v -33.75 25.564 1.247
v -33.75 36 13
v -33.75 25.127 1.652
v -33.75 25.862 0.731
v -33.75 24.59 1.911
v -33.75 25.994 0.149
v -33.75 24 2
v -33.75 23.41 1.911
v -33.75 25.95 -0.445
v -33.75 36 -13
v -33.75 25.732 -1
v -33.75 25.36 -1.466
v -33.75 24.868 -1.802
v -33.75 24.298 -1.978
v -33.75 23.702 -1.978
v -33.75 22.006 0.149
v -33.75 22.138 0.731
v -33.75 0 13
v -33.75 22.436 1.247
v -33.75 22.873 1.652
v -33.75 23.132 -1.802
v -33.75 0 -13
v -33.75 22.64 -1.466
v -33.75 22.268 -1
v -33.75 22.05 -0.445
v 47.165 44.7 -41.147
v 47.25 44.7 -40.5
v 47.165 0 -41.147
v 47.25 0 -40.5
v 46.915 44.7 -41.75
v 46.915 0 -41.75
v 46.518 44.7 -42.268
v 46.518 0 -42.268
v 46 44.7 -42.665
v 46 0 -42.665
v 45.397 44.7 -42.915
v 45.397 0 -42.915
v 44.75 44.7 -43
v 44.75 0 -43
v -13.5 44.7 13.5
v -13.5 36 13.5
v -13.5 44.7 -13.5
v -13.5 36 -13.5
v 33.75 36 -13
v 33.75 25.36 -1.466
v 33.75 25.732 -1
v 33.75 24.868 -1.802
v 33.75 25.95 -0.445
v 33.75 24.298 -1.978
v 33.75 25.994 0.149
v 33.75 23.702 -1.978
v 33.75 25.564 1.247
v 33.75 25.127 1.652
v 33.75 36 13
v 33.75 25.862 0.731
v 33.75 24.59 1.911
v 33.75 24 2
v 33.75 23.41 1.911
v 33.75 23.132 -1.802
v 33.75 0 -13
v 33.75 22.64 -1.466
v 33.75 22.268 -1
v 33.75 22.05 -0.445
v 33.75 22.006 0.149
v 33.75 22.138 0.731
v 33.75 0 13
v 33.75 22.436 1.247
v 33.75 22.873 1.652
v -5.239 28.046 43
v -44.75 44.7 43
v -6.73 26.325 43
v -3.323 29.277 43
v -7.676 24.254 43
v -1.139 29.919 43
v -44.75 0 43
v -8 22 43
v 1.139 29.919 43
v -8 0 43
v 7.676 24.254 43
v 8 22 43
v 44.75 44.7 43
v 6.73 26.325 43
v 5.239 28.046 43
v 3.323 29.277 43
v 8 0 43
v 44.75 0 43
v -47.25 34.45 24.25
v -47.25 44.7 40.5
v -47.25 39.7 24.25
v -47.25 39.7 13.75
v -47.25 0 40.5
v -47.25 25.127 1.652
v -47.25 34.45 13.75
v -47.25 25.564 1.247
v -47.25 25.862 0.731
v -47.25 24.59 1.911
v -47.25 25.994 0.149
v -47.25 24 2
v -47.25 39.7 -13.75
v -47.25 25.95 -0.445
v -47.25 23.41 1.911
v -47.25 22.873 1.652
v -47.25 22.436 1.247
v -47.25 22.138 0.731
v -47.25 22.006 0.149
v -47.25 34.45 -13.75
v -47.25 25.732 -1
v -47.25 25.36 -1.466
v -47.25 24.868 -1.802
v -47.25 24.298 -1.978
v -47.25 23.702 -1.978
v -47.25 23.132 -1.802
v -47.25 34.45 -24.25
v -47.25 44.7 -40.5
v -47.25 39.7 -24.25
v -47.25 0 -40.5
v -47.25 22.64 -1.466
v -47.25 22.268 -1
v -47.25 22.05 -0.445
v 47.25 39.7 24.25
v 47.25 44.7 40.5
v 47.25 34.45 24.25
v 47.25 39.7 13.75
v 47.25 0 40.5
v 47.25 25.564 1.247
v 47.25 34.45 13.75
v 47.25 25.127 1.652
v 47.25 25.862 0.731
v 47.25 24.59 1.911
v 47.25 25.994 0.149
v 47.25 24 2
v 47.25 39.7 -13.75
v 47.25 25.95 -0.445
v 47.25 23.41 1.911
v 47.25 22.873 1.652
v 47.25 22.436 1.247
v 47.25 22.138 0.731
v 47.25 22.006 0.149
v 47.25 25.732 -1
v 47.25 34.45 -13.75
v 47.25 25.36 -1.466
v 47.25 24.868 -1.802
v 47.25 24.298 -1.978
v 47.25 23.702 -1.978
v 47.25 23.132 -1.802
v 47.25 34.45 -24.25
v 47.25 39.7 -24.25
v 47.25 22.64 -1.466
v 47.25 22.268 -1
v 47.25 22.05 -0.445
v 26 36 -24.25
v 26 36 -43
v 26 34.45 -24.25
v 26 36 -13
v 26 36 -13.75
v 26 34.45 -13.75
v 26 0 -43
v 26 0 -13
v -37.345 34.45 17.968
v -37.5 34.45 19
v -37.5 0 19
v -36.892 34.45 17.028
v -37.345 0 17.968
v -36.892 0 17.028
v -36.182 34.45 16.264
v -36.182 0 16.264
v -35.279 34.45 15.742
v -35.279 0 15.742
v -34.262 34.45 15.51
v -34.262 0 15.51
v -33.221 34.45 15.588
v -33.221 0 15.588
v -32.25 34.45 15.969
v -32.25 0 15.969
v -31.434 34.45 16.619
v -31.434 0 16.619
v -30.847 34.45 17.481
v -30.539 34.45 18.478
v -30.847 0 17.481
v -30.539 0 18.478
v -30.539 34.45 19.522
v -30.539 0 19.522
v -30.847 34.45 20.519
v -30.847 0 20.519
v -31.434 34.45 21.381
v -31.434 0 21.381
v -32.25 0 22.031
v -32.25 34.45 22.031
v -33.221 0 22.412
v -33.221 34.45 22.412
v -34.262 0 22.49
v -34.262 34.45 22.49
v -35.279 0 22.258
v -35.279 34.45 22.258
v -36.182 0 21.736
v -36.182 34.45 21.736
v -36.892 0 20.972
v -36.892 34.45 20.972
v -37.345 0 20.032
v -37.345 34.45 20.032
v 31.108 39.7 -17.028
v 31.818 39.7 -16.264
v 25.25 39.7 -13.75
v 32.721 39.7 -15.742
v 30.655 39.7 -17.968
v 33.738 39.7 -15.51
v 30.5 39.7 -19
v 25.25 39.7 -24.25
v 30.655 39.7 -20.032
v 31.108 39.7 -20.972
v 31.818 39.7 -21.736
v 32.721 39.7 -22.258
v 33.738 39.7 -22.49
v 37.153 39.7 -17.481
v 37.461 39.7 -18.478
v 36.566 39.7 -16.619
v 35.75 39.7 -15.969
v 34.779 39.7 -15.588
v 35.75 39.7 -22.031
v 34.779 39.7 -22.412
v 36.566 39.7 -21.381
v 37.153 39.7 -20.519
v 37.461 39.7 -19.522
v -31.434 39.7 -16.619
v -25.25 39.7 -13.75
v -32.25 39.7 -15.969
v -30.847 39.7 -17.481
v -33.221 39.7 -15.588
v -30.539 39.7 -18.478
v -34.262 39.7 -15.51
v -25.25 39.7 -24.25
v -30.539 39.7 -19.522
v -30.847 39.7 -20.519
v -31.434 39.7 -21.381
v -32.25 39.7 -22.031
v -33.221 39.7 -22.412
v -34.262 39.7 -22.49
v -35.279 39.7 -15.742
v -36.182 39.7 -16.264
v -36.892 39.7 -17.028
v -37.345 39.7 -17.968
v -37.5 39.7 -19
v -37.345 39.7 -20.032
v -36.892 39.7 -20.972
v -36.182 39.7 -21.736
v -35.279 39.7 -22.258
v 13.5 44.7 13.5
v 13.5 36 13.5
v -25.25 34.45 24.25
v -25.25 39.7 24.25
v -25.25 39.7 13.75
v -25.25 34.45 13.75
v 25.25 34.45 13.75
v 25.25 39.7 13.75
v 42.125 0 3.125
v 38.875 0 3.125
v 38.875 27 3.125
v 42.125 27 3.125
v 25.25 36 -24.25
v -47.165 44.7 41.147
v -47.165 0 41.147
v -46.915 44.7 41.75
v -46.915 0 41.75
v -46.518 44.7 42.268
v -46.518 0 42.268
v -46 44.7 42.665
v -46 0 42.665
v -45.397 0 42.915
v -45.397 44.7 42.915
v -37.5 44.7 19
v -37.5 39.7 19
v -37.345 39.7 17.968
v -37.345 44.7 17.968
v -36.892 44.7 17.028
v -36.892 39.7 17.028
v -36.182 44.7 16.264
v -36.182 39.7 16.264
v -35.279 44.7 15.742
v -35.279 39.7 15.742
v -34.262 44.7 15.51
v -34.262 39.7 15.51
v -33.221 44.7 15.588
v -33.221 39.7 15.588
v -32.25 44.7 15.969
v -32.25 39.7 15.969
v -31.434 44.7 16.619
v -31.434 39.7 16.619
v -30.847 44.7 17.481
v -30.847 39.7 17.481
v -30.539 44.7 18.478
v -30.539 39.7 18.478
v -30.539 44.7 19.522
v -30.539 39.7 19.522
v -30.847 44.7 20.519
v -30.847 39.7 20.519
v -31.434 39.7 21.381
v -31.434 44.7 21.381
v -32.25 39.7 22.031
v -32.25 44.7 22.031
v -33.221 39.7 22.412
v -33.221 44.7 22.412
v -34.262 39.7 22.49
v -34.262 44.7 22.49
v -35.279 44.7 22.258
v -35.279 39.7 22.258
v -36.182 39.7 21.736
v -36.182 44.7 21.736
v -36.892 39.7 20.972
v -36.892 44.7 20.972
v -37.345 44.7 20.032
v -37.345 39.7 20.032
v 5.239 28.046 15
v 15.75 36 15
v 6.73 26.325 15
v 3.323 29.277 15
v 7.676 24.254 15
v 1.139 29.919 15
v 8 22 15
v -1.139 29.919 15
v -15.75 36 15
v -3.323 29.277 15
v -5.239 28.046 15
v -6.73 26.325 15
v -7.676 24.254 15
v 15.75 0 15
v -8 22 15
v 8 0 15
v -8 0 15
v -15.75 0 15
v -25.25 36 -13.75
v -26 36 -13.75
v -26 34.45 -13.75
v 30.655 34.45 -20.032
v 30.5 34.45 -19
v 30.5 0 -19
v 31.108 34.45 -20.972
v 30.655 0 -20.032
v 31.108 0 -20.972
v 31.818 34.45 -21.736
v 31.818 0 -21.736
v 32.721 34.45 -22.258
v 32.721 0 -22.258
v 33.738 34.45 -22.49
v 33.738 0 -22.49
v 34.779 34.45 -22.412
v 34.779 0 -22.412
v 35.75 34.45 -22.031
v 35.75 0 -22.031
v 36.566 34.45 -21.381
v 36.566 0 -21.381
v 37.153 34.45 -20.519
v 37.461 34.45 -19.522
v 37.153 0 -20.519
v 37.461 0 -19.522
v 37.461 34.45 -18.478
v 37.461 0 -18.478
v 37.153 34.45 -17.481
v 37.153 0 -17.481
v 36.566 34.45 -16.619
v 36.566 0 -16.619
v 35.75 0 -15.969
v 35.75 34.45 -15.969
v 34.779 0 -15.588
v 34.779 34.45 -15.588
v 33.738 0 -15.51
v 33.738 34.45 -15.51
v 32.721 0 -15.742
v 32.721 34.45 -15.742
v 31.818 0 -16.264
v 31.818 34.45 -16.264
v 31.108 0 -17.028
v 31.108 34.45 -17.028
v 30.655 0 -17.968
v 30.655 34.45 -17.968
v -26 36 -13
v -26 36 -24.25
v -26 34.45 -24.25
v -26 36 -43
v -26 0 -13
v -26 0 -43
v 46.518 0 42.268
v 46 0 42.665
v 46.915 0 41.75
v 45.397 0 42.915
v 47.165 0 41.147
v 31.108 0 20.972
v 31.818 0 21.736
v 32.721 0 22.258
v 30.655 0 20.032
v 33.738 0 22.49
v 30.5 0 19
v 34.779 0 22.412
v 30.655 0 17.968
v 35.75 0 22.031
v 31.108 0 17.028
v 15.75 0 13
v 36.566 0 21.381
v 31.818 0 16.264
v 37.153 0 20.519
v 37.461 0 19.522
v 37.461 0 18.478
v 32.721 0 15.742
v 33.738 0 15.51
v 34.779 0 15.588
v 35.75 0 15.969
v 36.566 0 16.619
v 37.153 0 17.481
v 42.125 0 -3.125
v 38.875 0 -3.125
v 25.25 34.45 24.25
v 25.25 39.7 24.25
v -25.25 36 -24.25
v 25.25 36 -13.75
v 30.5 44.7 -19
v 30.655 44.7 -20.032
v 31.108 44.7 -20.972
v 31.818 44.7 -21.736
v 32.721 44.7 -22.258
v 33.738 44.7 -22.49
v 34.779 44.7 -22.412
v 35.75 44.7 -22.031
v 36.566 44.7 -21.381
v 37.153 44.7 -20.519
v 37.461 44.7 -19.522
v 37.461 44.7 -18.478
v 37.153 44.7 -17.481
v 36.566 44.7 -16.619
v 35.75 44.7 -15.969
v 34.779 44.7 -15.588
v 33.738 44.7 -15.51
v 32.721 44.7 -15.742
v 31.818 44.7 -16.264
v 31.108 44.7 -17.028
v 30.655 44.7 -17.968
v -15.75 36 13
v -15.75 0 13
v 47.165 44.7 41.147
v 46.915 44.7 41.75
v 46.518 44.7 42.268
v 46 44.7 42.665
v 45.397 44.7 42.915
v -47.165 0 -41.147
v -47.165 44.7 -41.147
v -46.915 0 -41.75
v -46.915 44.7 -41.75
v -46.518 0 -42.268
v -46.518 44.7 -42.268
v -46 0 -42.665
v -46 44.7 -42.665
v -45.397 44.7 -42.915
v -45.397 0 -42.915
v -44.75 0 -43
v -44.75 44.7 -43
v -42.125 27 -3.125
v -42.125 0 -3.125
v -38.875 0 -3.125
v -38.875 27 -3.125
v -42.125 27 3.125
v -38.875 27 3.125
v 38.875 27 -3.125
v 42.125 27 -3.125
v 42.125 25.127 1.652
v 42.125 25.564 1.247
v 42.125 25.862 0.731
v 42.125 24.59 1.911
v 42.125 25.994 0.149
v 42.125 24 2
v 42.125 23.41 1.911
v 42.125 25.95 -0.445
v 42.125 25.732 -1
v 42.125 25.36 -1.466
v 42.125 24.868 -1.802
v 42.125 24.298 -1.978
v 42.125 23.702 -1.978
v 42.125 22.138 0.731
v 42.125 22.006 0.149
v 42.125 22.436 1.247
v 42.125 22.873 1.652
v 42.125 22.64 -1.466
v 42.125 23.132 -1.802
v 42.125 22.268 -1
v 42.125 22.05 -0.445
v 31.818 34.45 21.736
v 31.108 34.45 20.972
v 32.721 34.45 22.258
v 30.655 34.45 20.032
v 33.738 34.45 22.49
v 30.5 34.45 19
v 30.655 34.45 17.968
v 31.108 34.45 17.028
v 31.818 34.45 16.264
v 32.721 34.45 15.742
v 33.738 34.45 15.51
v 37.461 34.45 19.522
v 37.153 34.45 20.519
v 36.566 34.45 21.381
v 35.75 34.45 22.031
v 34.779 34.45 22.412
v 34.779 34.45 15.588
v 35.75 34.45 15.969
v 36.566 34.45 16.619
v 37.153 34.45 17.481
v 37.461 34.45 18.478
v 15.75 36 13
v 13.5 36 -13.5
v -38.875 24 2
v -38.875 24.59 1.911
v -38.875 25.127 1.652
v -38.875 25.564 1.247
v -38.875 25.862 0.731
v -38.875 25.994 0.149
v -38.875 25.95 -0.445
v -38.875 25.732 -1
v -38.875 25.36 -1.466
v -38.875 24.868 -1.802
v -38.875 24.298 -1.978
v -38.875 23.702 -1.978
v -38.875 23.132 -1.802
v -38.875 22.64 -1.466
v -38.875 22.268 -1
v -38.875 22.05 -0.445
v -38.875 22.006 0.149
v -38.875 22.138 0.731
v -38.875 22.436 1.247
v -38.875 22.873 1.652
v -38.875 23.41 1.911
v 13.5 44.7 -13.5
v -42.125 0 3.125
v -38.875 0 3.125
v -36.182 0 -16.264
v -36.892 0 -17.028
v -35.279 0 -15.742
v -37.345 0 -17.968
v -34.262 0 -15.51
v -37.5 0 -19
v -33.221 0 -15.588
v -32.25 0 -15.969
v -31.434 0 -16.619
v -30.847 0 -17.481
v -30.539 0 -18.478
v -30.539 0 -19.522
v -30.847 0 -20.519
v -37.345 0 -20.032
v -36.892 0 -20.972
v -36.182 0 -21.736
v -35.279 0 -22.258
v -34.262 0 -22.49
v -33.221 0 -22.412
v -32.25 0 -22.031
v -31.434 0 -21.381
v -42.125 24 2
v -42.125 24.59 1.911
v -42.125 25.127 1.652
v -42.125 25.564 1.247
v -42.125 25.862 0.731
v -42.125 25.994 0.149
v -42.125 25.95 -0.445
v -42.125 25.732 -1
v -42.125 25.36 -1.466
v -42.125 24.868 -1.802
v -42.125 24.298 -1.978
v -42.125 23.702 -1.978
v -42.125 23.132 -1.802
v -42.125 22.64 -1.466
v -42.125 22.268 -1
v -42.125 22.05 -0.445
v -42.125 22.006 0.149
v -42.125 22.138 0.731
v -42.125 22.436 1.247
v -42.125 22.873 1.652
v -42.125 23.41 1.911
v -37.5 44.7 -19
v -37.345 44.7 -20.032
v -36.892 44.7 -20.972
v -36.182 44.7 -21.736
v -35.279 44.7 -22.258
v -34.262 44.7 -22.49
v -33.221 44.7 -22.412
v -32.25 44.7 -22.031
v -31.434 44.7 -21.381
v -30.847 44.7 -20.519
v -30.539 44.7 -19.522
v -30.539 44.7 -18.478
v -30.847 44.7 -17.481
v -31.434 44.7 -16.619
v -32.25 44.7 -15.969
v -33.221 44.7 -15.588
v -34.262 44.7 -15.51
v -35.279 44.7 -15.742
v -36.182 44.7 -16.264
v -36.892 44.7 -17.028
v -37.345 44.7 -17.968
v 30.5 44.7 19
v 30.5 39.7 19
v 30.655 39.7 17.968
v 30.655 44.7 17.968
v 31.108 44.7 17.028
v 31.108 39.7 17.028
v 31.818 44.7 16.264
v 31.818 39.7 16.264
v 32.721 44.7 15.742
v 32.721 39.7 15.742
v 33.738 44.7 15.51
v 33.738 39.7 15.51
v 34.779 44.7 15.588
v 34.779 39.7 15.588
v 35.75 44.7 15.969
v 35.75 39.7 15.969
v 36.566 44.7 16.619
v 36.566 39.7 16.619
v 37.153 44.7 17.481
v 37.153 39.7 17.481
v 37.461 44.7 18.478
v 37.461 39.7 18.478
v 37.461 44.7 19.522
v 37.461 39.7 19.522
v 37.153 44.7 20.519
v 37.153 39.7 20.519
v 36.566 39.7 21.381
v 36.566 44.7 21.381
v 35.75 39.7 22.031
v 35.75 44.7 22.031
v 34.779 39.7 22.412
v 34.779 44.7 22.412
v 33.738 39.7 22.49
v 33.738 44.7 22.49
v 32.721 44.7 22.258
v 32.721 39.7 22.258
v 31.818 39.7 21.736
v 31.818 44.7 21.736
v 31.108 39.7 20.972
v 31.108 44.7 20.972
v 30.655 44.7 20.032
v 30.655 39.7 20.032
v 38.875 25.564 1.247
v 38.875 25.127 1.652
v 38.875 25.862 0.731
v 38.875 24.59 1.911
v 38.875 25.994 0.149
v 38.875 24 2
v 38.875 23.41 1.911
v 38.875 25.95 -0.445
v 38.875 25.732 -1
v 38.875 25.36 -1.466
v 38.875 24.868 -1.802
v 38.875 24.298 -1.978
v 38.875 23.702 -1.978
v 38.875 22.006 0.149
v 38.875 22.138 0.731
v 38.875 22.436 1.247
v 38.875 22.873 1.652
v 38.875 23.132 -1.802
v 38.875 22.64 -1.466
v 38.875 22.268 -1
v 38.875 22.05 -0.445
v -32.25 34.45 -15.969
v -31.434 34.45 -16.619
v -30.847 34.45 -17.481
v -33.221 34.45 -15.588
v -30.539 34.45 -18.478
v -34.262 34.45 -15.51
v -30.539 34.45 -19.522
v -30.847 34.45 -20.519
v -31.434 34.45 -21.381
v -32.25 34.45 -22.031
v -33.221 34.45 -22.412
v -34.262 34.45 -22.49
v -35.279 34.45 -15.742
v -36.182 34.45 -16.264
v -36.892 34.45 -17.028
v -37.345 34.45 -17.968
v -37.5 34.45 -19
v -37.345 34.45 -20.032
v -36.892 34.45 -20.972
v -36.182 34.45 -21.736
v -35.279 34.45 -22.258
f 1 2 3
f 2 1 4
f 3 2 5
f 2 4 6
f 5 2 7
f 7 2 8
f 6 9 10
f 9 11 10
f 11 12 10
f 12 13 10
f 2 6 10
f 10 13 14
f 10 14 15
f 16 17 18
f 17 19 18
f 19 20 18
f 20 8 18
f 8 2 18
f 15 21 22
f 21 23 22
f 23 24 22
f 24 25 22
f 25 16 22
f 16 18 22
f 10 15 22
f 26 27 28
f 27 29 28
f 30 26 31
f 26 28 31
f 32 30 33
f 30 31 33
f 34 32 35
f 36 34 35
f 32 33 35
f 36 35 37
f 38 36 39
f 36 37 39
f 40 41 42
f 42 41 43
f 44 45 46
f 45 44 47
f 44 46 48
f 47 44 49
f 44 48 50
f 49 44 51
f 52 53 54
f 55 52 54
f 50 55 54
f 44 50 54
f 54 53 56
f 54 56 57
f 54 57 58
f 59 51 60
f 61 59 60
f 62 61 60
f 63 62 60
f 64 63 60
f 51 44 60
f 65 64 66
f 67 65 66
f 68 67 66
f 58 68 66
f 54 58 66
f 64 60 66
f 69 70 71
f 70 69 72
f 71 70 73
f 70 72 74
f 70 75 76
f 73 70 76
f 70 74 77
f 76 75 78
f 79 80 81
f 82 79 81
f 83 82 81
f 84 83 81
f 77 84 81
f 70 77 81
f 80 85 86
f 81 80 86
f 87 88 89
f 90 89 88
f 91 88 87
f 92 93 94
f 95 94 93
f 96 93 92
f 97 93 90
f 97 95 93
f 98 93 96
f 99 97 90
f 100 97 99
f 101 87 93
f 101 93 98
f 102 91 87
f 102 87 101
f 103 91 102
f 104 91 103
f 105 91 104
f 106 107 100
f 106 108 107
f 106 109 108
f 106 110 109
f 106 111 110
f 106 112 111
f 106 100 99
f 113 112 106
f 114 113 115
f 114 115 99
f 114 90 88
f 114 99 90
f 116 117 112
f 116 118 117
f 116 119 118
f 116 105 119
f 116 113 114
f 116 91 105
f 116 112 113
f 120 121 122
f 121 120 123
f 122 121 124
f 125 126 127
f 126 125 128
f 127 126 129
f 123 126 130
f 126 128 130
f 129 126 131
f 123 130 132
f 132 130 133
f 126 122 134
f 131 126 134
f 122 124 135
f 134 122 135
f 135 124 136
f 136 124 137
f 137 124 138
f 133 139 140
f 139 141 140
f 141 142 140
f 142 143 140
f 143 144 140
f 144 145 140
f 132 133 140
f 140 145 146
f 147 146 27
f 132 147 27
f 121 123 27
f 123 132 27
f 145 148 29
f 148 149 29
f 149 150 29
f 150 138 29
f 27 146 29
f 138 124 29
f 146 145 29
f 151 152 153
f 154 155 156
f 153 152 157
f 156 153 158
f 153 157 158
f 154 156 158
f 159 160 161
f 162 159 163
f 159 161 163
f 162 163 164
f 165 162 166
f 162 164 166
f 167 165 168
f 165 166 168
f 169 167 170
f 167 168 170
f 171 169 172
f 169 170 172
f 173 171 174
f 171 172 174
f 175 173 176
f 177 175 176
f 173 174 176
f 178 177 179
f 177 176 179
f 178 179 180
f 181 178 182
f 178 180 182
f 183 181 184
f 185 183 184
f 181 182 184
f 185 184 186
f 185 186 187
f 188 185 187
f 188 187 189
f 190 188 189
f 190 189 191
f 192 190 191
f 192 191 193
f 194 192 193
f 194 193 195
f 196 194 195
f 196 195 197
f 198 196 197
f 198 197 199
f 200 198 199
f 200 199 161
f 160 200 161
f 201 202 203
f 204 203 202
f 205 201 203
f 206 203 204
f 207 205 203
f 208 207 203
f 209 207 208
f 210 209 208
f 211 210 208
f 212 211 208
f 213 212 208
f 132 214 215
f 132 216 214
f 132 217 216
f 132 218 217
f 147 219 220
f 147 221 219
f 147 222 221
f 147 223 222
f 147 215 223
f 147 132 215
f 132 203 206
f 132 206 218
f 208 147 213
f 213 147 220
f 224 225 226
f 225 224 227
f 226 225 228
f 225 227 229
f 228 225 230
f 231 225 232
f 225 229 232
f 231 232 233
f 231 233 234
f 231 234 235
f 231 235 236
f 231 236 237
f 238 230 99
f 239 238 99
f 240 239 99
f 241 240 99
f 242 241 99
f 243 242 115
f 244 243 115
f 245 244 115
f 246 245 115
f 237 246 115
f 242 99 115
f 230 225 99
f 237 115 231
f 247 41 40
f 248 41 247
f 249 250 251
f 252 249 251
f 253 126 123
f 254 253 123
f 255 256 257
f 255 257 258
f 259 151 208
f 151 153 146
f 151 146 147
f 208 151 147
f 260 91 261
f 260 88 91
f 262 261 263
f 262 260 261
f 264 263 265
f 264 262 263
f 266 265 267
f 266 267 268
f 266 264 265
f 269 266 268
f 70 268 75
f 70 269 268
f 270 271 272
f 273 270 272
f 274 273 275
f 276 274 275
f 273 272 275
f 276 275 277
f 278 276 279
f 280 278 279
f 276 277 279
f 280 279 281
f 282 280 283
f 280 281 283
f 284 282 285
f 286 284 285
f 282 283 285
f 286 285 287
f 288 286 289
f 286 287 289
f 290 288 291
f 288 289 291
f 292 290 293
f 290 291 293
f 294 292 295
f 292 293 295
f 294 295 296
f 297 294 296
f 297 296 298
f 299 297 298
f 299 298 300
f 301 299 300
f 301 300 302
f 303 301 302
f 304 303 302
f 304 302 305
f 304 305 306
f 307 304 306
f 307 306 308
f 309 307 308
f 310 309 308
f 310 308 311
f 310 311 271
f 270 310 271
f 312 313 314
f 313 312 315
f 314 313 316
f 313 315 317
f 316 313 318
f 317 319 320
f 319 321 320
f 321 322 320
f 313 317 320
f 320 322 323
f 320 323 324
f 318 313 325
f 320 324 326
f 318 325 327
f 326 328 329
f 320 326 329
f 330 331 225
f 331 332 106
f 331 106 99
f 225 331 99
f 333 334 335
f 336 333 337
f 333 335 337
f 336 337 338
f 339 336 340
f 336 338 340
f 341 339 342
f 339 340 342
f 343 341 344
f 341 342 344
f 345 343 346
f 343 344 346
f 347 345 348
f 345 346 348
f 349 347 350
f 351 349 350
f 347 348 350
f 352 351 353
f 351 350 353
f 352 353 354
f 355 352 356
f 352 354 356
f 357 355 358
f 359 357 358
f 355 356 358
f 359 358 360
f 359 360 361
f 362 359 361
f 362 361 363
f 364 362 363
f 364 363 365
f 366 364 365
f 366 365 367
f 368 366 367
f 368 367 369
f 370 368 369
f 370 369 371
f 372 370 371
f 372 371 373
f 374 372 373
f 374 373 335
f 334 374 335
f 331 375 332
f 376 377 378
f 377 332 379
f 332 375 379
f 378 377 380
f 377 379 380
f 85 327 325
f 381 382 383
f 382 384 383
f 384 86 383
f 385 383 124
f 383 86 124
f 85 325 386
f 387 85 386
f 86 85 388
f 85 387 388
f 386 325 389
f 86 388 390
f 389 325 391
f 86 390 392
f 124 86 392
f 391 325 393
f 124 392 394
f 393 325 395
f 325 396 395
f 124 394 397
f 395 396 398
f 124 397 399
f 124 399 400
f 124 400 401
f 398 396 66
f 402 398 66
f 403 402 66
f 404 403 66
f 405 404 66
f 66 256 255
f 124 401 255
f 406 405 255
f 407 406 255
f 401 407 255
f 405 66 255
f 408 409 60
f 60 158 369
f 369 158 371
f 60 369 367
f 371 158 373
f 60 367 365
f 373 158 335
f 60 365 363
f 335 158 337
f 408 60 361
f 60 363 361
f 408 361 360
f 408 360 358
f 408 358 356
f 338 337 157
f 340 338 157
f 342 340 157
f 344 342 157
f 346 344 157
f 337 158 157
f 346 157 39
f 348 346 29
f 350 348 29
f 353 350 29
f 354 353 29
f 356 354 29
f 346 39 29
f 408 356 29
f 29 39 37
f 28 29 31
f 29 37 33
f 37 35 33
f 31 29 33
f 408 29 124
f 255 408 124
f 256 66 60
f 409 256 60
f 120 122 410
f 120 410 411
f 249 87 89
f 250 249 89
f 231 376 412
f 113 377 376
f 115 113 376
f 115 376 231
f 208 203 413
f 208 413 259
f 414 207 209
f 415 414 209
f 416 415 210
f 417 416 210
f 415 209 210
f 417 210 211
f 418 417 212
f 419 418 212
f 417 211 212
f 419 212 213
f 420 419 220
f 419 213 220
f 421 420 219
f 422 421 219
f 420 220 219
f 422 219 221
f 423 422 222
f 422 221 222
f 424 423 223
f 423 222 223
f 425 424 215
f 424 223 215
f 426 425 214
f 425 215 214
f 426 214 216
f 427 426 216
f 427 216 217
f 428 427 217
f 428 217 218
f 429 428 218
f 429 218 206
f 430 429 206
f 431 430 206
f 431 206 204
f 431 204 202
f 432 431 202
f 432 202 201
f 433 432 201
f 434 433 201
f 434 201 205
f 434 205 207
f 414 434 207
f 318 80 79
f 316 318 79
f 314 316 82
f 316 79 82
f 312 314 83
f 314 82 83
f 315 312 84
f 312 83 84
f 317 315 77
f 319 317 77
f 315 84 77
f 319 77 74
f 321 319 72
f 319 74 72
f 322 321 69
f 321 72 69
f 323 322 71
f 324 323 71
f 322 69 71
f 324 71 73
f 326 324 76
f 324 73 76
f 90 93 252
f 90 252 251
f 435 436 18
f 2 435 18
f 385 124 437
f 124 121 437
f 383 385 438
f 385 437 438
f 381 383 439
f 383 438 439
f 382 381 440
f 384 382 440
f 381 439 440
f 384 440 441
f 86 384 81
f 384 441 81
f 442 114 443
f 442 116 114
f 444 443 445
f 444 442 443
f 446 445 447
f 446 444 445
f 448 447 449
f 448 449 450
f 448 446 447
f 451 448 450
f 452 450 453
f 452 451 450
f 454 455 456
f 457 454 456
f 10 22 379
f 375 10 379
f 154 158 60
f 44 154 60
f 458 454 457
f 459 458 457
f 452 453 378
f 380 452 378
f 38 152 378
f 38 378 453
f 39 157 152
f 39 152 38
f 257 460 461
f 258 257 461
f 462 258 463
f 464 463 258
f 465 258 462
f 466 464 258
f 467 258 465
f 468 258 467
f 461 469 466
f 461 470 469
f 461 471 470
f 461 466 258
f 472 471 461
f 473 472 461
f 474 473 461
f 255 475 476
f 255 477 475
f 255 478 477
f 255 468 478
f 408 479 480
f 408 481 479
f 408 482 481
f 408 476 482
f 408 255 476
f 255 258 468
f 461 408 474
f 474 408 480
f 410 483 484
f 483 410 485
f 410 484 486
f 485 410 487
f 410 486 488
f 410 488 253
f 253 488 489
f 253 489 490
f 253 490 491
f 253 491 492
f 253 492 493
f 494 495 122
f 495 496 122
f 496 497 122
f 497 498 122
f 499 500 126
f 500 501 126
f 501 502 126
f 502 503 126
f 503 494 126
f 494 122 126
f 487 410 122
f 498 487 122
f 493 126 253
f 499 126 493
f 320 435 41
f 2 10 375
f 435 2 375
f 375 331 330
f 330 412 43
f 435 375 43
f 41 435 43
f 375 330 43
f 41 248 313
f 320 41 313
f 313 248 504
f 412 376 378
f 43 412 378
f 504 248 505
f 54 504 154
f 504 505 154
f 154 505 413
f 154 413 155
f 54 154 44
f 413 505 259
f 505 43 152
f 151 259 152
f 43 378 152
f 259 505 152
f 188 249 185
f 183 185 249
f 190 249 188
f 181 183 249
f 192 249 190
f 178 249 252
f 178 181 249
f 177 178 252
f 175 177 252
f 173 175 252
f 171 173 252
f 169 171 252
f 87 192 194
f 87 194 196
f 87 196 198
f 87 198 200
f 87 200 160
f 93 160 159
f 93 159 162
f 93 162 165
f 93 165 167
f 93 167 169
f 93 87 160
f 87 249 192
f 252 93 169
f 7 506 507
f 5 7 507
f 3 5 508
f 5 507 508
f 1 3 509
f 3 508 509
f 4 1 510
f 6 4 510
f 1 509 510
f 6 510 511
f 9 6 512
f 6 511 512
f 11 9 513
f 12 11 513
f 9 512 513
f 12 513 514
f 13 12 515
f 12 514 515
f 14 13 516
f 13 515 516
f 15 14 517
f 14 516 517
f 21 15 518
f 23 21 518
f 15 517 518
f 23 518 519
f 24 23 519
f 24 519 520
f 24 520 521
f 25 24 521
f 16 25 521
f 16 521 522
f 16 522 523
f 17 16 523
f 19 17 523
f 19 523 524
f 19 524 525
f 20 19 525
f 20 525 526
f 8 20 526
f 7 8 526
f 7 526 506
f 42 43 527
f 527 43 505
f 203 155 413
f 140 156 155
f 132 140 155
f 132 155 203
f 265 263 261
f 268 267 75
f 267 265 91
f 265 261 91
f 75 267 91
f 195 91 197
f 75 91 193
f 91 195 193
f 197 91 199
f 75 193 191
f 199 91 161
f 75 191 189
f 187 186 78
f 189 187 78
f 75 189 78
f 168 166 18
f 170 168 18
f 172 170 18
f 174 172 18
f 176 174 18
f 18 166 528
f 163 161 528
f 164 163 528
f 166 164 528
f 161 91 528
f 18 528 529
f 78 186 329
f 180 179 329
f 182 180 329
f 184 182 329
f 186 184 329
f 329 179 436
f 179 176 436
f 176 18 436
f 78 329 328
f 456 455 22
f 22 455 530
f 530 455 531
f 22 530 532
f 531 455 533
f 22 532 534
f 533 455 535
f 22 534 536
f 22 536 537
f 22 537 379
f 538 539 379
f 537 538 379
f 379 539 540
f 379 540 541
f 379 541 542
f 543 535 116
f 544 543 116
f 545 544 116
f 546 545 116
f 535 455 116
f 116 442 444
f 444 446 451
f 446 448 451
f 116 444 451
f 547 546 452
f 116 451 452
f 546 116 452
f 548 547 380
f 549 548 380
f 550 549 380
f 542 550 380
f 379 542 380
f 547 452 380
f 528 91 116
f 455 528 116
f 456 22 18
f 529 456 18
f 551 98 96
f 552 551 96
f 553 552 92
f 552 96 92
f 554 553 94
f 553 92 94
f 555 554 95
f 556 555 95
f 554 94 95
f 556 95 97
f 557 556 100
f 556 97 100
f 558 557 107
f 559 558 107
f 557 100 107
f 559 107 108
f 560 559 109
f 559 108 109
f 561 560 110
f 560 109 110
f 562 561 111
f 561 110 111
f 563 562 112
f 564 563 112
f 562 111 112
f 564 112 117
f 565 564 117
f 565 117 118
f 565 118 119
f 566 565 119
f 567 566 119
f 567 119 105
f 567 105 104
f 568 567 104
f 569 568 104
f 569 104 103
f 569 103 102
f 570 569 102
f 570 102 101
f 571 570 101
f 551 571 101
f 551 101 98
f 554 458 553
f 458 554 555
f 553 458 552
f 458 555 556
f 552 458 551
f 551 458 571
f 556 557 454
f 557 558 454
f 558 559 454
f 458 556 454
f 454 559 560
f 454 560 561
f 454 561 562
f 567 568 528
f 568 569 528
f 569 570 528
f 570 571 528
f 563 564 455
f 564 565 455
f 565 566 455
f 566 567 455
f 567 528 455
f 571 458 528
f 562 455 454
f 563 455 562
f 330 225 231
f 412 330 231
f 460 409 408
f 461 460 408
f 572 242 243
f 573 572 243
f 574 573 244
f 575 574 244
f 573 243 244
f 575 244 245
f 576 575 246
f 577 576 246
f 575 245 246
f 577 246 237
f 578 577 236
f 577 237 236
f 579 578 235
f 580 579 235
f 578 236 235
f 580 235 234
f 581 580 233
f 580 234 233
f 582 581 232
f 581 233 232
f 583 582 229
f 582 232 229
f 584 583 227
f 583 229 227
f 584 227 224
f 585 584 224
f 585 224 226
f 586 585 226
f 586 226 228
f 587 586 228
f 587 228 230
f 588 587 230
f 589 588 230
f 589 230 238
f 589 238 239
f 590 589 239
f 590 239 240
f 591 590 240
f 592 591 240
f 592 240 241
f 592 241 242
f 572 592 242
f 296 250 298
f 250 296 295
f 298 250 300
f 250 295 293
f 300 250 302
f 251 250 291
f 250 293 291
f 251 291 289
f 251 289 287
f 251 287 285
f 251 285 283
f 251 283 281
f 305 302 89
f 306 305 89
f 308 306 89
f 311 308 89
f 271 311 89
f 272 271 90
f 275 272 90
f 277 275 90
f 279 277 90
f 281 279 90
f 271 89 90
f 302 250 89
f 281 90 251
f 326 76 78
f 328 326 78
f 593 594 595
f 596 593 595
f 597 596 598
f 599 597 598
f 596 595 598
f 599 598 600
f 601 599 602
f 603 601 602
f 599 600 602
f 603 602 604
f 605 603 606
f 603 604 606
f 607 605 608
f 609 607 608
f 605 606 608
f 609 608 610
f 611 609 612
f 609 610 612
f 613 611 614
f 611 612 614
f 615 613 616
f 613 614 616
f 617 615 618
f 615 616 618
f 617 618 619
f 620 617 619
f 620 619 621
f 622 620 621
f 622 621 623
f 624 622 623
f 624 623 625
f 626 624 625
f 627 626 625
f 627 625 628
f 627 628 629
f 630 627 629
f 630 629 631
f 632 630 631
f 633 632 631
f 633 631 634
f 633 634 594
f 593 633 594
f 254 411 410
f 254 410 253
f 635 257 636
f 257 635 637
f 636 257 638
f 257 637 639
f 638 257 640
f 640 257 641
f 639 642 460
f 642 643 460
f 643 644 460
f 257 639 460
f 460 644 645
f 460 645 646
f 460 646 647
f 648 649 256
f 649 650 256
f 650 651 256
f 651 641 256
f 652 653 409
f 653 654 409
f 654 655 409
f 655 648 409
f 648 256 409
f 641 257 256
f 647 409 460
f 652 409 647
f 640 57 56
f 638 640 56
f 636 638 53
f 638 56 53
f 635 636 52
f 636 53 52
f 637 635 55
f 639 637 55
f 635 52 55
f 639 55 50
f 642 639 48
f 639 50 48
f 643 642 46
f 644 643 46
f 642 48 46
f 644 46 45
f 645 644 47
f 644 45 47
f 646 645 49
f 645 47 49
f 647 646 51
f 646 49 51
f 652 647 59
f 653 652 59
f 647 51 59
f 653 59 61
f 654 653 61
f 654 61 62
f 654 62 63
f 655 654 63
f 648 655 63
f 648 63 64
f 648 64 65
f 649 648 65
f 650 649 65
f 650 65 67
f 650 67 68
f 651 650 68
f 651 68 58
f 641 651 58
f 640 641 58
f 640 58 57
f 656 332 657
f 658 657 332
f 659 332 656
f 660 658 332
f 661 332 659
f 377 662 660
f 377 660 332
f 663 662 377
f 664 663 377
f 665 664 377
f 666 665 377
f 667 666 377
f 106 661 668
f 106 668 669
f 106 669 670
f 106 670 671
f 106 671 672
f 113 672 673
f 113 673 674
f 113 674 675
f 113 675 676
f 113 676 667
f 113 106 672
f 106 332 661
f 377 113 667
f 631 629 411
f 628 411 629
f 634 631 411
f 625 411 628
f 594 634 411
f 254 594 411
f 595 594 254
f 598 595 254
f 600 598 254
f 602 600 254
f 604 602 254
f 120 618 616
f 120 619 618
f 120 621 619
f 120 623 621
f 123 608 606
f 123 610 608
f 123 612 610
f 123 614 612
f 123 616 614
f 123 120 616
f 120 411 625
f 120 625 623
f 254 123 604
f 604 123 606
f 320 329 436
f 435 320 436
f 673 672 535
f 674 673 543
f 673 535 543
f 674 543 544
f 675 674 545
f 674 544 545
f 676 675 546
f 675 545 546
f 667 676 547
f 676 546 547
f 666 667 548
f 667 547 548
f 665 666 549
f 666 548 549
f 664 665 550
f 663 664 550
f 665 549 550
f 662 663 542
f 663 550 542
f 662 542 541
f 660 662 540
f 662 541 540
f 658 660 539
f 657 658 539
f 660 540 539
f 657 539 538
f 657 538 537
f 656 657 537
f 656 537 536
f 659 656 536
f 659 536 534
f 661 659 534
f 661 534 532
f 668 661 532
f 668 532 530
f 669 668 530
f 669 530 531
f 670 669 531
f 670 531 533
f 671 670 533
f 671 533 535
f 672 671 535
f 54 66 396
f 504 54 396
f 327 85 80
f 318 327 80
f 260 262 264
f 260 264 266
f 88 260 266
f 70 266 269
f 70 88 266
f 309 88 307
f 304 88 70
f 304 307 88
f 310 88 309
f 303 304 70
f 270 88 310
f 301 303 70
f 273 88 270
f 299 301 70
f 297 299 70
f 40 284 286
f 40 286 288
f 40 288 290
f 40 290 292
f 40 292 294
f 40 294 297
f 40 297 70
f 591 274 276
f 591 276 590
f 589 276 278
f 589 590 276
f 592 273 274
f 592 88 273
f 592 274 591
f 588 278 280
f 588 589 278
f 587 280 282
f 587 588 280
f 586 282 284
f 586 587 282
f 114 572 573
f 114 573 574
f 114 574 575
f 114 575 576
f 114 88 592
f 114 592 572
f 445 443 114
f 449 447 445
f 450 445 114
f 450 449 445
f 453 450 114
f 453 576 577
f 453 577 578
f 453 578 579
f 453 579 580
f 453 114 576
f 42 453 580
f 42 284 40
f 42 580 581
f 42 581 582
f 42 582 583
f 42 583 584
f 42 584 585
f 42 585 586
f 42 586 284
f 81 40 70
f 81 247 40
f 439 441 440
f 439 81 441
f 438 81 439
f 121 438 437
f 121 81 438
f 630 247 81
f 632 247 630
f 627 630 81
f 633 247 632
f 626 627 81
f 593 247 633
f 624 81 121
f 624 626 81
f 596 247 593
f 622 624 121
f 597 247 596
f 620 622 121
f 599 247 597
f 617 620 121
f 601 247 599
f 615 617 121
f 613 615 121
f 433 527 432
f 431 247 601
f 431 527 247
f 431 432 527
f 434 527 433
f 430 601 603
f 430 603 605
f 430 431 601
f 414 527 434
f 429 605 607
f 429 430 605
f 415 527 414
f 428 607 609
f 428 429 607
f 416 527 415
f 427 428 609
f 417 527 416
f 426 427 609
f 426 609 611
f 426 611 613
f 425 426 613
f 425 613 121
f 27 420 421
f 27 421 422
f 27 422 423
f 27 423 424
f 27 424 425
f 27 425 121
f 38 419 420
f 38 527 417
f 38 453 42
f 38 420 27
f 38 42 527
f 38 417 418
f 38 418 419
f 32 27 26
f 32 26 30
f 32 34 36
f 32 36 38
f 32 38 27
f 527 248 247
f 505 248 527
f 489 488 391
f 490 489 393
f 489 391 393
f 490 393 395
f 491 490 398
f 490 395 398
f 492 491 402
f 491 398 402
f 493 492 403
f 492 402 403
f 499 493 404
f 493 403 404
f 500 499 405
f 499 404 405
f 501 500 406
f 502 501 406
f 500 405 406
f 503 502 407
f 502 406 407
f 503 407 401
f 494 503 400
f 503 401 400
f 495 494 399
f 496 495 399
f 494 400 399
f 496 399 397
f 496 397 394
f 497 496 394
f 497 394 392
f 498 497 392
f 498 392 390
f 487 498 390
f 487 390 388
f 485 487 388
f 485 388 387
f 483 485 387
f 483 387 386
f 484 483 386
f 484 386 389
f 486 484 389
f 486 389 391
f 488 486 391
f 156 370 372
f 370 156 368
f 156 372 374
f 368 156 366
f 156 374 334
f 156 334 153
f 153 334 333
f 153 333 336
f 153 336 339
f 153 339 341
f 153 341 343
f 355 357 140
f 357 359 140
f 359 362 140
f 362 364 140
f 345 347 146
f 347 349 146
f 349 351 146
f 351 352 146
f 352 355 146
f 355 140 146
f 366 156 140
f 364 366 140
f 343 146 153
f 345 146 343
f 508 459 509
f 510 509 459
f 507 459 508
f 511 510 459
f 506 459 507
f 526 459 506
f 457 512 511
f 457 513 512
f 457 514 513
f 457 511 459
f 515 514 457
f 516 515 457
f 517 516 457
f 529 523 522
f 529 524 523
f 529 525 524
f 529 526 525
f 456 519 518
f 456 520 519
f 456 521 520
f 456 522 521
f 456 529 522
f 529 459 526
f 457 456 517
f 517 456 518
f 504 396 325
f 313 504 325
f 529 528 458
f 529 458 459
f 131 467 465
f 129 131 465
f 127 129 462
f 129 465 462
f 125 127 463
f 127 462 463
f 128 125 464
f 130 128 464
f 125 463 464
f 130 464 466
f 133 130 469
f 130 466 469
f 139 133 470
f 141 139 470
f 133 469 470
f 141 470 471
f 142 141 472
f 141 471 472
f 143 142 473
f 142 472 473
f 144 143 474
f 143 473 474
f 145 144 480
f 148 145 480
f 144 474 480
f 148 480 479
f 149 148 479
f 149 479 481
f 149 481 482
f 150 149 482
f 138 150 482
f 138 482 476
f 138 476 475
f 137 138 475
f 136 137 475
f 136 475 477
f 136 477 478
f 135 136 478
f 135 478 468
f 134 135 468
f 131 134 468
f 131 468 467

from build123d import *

# Parameters (mm, degrees)
BOSS_EXTRUDE1_DEPTH  = 36
M3_CLEARANCE_HOLE1_D = 4
SKETCH6_W            = 94.5
SKETCH6_H            = 86
SKETCH6_W_2          = 27
SKETCH6_H_2          = 27
BOSS_EXTRUDE2_DEPTH  = 8.7
FILLET1_R            = 2.5
SKETCH2_3_W          = 3.25
SKETCH2_3_H          = 6.25
CUT_EXTRUDE1_DEPTH   = 27
CUT_EXTRUDE2_DEPTH   = 108.826956277
M6_CLEARANCE_HOLE1_D = 7
SKETCH12_W           = 10.5
SKETCH12_H           = 5.25
CUT_EXTRUDE4_DEPTH   = 22


with BuildPart() as part:
    # Sketch2 → Boss-Extrude1 (new body)
    with BuildSketch(Plane(origin=(0, 0, 0), x_dir=(1, 0, 0), z_dir=(0, 1, 0))):
        Polygon((-33.75, 13), (-26, 13), (-26, 43), (-47.25, 43), (-47.25, -43), (47.25, -43), (47.25, 43), (26, 43), (26, 13), (33.75, 13), (33.75, -13), (15.75, -13), (15.75, -15), (-15.75, -15), (-15.75, -13), (-33.75, -13), align=None)
    extrude(amount=BOSS_EXTRUDE1_DEPTH)

    # M3 Clearance Hole1 (through all)
    with Locations(Plane(origin=(47.25, 0, 0), x_dir=(0, 0, -1), z_dir=(1, 0, 0))):
        with Locations((0, 24)):
            Hole(M3_CLEARANCE_HOLE1_D / 2)

    # Sketch6 → Boss-Extrude2 (add)
    with BuildSketch(Plane(origin=(0, 36, 0), x_dir=(1, 0, 0), z_dir=(0, 1, 0))):
        Rectangle(SKETCH6_W, SKETCH6_H)
        Rectangle(SKETCH6_W_2, SKETCH6_H_2, mode=Mode.SUBTRACT)
    extrude(amount=BOSS_EXTRUDE2_DEPTH)

    # Fillet1
    fillet1_edges = [part.edges().sort_by_distance(p)[0] for p in [
        (47.25, 22.35, -43),
        (47.25, 22.35, 43),
        (-47.25, 22.35, 43),
        (-47.25, 22.35, -43),
    ]]
    fillet(fillet1_edges, radius=FILLET1_R)

    # Sketch2<3> → Cut-Extrude1 (cut)
    with BuildSketch(Plane(origin=(0, 0, 0), x_dir=(1, 0, 0), z_dir=(0, 1, 0))):
        with Locations((-40.5, 0)):
            Rectangle(SKETCH2_3_W, SKETCH2_3_H)
        with Locations((40.5, 0)):
            Rectangle(SKETCH2_3_W, SKETCH2_3_H)
    extrude(amount=CUT_EXTRUDE1_DEPTH, mode=Mode.SUBTRACT)

    # Sketch8 → Cut-Extrude2 (cut, through all)
    with BuildSketch(Plane.XY.offset(43)):
        with BuildLine():
            Line((-8, 22), (-8, 0))
            Line((-8, 0), (8, 0))
            Line((8, 0), (8, 22))
            ThreePointArc((8, 22), (0, 30), (-8, 22))
        make_face()
    extrude(amount=-CUT_EXTRUDE2_DEPTH, mode=Mode.SUBTRACT)

    # M6 Clearance Hole1 (through all)
    with Locations(Plane(origin=(0, 44.7, 0), x_dir=(1, 0, 0), z_dir=(0, 1, 0))):
        with Locations((-34, 19), (34, 19), (34, -19), (-34, -19)):
            Hole(M6_CLEARANCE_HOLE1_D / 2)

    # Sketch12 → Cut-Extrude4 (cut)
    with BuildSketch(Plane(origin=(47.25, 0, 0), x_dir=(0, 0, -1), z_dir=(1, 0, 0))):
        with Locations((-19, 37.075)):
            Rectangle(SKETCH12_W, SKETCH12_H)
        with Locations((19, 37.075)):
            Rectangle(SKETCH12_W, SKETCH12_H)
    cut_extrude4 = extrude(amount=-CUT_EXTRUDE4_DEPTH, mode=Mode.SUBTRACT)

    # Mirror2: Cut-Extrude4 across plane
    add(cut_extrude4.mirror(Plane(origin=(0, 0, 0), x_dir=(0, 0, 1), z_dir=(1, 0, 0))), mode=Mode.SUBTRACT)


solid = part.part
